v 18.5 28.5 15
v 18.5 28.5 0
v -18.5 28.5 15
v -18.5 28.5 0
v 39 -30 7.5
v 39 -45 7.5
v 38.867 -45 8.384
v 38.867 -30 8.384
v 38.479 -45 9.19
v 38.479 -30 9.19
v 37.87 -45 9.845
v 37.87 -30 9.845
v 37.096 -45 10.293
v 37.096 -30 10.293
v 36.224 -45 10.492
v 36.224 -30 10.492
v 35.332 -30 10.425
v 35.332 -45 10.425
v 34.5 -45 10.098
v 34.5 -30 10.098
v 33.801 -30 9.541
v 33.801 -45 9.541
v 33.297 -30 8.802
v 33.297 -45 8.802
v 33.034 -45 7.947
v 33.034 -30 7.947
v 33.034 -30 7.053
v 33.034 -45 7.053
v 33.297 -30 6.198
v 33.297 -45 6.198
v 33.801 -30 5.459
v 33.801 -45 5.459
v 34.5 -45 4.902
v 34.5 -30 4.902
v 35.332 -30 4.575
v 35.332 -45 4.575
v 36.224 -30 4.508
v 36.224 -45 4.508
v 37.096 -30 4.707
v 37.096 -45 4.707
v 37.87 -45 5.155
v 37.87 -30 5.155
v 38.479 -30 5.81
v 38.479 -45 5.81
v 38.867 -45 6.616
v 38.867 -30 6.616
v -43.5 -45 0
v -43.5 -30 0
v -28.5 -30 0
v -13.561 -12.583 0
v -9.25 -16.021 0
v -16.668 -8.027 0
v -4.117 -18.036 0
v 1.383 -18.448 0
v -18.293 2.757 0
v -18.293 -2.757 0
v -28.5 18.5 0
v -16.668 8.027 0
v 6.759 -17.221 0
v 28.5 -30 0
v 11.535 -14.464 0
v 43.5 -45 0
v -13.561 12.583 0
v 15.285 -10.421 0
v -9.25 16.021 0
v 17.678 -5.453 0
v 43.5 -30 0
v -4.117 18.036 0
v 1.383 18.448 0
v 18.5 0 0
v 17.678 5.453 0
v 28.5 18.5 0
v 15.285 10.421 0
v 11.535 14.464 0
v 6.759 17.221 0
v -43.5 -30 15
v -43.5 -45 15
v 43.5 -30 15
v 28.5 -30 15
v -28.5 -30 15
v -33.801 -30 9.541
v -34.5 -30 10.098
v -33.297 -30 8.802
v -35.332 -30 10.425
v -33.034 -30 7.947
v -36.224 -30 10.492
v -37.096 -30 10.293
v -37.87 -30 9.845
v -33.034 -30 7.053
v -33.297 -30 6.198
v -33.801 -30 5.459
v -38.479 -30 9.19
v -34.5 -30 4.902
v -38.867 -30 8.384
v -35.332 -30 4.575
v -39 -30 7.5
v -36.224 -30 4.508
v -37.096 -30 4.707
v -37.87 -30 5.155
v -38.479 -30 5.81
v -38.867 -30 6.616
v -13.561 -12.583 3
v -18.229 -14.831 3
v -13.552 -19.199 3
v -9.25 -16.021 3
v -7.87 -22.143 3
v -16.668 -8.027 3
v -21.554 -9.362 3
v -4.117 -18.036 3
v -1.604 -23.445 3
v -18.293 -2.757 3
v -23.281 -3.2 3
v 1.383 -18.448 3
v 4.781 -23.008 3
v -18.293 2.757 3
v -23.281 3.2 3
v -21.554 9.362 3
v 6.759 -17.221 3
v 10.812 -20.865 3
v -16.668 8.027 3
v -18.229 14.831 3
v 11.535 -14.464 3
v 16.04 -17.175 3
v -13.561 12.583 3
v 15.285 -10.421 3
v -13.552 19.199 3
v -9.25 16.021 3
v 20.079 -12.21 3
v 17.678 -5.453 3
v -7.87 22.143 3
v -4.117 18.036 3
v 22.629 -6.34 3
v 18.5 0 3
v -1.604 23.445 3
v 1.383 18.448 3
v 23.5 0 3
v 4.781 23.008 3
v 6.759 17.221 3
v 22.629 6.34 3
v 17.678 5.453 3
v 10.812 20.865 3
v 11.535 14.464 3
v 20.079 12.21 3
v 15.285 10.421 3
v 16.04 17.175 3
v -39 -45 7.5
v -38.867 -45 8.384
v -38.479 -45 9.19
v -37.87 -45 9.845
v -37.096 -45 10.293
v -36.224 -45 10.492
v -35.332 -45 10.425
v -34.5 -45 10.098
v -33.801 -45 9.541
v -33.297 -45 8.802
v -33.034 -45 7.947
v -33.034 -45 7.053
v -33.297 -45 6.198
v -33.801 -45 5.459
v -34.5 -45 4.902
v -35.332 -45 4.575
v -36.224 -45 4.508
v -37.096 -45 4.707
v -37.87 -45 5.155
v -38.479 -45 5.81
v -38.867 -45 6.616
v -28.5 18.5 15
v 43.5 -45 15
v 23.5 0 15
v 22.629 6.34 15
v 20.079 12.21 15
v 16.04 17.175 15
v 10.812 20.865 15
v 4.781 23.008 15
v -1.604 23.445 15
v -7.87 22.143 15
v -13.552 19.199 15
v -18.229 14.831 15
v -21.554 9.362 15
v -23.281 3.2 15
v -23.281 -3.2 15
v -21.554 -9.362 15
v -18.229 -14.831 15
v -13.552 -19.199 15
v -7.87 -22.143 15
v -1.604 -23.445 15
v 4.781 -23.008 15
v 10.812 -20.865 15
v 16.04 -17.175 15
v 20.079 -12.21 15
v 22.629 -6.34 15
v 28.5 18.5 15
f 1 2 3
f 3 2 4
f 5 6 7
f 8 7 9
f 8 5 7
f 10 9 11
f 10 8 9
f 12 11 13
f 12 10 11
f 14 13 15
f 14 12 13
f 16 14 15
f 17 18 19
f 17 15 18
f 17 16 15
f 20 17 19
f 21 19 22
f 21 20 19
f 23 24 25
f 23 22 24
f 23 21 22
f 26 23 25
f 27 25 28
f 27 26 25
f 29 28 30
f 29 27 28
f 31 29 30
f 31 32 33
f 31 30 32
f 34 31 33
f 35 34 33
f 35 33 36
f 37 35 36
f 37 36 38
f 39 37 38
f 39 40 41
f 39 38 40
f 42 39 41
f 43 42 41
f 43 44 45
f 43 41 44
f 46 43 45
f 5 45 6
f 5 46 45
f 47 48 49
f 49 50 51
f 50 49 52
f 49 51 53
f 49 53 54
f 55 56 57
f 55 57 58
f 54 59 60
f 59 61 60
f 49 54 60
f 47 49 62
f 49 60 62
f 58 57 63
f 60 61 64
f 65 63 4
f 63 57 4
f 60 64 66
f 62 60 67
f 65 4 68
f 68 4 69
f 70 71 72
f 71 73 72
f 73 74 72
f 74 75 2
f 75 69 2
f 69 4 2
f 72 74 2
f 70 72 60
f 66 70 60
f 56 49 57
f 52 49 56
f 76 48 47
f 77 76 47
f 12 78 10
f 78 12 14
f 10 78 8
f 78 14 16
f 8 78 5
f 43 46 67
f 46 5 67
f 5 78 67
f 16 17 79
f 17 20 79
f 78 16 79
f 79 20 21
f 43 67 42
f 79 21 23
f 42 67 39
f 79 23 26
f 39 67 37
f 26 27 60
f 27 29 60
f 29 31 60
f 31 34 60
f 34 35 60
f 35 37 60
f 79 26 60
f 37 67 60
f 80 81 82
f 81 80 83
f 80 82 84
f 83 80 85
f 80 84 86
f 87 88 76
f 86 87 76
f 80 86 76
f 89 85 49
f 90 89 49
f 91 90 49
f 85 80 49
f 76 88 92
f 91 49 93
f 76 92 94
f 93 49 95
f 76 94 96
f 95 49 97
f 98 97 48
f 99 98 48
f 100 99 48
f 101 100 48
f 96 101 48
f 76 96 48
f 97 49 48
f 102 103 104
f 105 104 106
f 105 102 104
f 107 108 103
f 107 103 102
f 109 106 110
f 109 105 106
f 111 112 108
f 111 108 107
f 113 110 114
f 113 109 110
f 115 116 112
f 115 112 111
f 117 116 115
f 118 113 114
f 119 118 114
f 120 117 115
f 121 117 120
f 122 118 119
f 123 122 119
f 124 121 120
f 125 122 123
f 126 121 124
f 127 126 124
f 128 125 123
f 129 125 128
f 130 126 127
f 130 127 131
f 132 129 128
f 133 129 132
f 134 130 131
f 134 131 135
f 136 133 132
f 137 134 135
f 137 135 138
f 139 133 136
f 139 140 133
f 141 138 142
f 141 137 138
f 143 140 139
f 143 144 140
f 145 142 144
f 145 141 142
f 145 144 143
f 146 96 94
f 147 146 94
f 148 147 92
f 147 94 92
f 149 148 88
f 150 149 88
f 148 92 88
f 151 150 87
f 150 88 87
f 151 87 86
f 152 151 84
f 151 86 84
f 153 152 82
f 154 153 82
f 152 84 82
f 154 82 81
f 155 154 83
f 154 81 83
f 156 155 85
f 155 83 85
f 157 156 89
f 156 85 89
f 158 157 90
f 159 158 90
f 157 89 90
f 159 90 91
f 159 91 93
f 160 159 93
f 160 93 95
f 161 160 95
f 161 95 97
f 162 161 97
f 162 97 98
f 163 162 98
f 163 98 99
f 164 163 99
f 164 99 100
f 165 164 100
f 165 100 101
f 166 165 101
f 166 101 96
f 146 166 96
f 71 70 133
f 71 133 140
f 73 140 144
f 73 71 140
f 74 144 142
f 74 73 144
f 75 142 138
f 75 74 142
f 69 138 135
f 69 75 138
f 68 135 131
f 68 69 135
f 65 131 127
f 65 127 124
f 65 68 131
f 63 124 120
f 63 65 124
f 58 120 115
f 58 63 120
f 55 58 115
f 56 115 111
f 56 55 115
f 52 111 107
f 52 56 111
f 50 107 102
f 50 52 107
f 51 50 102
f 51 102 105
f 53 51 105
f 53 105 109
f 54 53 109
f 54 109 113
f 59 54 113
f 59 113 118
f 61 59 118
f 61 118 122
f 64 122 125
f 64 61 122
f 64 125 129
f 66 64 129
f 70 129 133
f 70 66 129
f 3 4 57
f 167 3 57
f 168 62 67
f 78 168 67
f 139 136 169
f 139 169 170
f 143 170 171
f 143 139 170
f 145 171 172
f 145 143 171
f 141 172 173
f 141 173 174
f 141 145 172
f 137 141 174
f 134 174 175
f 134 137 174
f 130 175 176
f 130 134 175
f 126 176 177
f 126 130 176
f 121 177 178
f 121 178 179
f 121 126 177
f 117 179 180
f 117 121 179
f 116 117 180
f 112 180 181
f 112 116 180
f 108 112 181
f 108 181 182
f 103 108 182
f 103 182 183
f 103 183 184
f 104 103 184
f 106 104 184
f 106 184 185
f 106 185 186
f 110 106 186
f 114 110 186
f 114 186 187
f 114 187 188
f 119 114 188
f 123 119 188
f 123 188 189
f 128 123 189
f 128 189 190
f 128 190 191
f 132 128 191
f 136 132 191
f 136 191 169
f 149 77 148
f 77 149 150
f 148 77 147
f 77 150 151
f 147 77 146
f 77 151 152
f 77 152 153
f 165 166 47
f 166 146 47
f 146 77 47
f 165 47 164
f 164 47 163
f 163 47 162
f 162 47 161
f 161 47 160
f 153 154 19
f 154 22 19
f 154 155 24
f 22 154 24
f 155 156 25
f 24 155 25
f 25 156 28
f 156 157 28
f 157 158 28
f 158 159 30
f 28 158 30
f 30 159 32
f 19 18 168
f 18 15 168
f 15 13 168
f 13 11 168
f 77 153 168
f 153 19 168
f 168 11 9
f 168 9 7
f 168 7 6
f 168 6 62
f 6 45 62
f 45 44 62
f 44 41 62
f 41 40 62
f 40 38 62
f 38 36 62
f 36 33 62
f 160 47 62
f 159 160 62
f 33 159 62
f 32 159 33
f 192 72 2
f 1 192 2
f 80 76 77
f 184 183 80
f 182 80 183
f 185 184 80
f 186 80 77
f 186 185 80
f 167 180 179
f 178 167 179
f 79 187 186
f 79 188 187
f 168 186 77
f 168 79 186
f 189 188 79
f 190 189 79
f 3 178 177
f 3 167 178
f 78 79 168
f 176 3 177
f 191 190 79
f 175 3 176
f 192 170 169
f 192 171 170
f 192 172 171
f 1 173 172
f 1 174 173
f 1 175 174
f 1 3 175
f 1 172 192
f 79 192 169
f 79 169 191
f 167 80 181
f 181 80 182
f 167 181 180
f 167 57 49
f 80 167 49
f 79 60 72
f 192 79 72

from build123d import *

# Parameters (mm, degrees)
SKETCH_1_R          = 23.5
EXTRUDE_1_DEPTH     = 15
SKETCH_1_3_R        = 23.5
SKETCH_1_3_R_2      = 18.5
EXTRUDE_2_DEPTH     = 3
SKETCH_2_R          = 3
CUT_EXTRUDE_1_DEPTH = 75.42781738


with BuildPart() as part:
    # 草图1 → 凸台-拉伸1 (new body)
    with BuildSketch(Plane.XY):
        Polygon((-18.5, 28.5), (-28.5, 18.5), (-28.5, -30), (-43.5, -30), (-43.5, -45), (43.5, -45), (43.5, -30), (28.5, -30), (28.5, 18.5), (18.5, 28.5), align=None)
        Circle(SKETCH_1_R, mode=Mode.SUBTRACT)
    extrude(amount=EXTRUDE_1_DEPTH)

    # 草图1<3> → 凸台-拉伸2 (add)
    with BuildSketch(Plane.XY):
        Circle(SKETCH_1_3_R)
        Circle(SKETCH_1_3_R_2, mode=Mode.SUBTRACT)
    extrude(amount=EXTRUDE_2_DEPTH)

    # 草图2 → 切除-拉伸1 (cut, through all)
    with BuildSketch(Plane(origin=(0, -30, 0), x_dir=(1, 0, 0), z_dir=(0, 1, 0))):
        with Locations((-36, -7.5)):
            Circle(SKETCH_2_R)
    cut_extrude_1 = extrude(amount=-CUT_EXTRUDE_1_DEPTH, mode=Mode.SUBTRACT)

    # 镜向1: 切除-拉伸1 across plane
    add(cut_extrude_1.mirror(Plane(origin=(0, 0, 0), x_dir=(0, 0, 1), z_dir=(1, 0, 0))), mode=Mode.SUBTRACT)


solid = part.part
